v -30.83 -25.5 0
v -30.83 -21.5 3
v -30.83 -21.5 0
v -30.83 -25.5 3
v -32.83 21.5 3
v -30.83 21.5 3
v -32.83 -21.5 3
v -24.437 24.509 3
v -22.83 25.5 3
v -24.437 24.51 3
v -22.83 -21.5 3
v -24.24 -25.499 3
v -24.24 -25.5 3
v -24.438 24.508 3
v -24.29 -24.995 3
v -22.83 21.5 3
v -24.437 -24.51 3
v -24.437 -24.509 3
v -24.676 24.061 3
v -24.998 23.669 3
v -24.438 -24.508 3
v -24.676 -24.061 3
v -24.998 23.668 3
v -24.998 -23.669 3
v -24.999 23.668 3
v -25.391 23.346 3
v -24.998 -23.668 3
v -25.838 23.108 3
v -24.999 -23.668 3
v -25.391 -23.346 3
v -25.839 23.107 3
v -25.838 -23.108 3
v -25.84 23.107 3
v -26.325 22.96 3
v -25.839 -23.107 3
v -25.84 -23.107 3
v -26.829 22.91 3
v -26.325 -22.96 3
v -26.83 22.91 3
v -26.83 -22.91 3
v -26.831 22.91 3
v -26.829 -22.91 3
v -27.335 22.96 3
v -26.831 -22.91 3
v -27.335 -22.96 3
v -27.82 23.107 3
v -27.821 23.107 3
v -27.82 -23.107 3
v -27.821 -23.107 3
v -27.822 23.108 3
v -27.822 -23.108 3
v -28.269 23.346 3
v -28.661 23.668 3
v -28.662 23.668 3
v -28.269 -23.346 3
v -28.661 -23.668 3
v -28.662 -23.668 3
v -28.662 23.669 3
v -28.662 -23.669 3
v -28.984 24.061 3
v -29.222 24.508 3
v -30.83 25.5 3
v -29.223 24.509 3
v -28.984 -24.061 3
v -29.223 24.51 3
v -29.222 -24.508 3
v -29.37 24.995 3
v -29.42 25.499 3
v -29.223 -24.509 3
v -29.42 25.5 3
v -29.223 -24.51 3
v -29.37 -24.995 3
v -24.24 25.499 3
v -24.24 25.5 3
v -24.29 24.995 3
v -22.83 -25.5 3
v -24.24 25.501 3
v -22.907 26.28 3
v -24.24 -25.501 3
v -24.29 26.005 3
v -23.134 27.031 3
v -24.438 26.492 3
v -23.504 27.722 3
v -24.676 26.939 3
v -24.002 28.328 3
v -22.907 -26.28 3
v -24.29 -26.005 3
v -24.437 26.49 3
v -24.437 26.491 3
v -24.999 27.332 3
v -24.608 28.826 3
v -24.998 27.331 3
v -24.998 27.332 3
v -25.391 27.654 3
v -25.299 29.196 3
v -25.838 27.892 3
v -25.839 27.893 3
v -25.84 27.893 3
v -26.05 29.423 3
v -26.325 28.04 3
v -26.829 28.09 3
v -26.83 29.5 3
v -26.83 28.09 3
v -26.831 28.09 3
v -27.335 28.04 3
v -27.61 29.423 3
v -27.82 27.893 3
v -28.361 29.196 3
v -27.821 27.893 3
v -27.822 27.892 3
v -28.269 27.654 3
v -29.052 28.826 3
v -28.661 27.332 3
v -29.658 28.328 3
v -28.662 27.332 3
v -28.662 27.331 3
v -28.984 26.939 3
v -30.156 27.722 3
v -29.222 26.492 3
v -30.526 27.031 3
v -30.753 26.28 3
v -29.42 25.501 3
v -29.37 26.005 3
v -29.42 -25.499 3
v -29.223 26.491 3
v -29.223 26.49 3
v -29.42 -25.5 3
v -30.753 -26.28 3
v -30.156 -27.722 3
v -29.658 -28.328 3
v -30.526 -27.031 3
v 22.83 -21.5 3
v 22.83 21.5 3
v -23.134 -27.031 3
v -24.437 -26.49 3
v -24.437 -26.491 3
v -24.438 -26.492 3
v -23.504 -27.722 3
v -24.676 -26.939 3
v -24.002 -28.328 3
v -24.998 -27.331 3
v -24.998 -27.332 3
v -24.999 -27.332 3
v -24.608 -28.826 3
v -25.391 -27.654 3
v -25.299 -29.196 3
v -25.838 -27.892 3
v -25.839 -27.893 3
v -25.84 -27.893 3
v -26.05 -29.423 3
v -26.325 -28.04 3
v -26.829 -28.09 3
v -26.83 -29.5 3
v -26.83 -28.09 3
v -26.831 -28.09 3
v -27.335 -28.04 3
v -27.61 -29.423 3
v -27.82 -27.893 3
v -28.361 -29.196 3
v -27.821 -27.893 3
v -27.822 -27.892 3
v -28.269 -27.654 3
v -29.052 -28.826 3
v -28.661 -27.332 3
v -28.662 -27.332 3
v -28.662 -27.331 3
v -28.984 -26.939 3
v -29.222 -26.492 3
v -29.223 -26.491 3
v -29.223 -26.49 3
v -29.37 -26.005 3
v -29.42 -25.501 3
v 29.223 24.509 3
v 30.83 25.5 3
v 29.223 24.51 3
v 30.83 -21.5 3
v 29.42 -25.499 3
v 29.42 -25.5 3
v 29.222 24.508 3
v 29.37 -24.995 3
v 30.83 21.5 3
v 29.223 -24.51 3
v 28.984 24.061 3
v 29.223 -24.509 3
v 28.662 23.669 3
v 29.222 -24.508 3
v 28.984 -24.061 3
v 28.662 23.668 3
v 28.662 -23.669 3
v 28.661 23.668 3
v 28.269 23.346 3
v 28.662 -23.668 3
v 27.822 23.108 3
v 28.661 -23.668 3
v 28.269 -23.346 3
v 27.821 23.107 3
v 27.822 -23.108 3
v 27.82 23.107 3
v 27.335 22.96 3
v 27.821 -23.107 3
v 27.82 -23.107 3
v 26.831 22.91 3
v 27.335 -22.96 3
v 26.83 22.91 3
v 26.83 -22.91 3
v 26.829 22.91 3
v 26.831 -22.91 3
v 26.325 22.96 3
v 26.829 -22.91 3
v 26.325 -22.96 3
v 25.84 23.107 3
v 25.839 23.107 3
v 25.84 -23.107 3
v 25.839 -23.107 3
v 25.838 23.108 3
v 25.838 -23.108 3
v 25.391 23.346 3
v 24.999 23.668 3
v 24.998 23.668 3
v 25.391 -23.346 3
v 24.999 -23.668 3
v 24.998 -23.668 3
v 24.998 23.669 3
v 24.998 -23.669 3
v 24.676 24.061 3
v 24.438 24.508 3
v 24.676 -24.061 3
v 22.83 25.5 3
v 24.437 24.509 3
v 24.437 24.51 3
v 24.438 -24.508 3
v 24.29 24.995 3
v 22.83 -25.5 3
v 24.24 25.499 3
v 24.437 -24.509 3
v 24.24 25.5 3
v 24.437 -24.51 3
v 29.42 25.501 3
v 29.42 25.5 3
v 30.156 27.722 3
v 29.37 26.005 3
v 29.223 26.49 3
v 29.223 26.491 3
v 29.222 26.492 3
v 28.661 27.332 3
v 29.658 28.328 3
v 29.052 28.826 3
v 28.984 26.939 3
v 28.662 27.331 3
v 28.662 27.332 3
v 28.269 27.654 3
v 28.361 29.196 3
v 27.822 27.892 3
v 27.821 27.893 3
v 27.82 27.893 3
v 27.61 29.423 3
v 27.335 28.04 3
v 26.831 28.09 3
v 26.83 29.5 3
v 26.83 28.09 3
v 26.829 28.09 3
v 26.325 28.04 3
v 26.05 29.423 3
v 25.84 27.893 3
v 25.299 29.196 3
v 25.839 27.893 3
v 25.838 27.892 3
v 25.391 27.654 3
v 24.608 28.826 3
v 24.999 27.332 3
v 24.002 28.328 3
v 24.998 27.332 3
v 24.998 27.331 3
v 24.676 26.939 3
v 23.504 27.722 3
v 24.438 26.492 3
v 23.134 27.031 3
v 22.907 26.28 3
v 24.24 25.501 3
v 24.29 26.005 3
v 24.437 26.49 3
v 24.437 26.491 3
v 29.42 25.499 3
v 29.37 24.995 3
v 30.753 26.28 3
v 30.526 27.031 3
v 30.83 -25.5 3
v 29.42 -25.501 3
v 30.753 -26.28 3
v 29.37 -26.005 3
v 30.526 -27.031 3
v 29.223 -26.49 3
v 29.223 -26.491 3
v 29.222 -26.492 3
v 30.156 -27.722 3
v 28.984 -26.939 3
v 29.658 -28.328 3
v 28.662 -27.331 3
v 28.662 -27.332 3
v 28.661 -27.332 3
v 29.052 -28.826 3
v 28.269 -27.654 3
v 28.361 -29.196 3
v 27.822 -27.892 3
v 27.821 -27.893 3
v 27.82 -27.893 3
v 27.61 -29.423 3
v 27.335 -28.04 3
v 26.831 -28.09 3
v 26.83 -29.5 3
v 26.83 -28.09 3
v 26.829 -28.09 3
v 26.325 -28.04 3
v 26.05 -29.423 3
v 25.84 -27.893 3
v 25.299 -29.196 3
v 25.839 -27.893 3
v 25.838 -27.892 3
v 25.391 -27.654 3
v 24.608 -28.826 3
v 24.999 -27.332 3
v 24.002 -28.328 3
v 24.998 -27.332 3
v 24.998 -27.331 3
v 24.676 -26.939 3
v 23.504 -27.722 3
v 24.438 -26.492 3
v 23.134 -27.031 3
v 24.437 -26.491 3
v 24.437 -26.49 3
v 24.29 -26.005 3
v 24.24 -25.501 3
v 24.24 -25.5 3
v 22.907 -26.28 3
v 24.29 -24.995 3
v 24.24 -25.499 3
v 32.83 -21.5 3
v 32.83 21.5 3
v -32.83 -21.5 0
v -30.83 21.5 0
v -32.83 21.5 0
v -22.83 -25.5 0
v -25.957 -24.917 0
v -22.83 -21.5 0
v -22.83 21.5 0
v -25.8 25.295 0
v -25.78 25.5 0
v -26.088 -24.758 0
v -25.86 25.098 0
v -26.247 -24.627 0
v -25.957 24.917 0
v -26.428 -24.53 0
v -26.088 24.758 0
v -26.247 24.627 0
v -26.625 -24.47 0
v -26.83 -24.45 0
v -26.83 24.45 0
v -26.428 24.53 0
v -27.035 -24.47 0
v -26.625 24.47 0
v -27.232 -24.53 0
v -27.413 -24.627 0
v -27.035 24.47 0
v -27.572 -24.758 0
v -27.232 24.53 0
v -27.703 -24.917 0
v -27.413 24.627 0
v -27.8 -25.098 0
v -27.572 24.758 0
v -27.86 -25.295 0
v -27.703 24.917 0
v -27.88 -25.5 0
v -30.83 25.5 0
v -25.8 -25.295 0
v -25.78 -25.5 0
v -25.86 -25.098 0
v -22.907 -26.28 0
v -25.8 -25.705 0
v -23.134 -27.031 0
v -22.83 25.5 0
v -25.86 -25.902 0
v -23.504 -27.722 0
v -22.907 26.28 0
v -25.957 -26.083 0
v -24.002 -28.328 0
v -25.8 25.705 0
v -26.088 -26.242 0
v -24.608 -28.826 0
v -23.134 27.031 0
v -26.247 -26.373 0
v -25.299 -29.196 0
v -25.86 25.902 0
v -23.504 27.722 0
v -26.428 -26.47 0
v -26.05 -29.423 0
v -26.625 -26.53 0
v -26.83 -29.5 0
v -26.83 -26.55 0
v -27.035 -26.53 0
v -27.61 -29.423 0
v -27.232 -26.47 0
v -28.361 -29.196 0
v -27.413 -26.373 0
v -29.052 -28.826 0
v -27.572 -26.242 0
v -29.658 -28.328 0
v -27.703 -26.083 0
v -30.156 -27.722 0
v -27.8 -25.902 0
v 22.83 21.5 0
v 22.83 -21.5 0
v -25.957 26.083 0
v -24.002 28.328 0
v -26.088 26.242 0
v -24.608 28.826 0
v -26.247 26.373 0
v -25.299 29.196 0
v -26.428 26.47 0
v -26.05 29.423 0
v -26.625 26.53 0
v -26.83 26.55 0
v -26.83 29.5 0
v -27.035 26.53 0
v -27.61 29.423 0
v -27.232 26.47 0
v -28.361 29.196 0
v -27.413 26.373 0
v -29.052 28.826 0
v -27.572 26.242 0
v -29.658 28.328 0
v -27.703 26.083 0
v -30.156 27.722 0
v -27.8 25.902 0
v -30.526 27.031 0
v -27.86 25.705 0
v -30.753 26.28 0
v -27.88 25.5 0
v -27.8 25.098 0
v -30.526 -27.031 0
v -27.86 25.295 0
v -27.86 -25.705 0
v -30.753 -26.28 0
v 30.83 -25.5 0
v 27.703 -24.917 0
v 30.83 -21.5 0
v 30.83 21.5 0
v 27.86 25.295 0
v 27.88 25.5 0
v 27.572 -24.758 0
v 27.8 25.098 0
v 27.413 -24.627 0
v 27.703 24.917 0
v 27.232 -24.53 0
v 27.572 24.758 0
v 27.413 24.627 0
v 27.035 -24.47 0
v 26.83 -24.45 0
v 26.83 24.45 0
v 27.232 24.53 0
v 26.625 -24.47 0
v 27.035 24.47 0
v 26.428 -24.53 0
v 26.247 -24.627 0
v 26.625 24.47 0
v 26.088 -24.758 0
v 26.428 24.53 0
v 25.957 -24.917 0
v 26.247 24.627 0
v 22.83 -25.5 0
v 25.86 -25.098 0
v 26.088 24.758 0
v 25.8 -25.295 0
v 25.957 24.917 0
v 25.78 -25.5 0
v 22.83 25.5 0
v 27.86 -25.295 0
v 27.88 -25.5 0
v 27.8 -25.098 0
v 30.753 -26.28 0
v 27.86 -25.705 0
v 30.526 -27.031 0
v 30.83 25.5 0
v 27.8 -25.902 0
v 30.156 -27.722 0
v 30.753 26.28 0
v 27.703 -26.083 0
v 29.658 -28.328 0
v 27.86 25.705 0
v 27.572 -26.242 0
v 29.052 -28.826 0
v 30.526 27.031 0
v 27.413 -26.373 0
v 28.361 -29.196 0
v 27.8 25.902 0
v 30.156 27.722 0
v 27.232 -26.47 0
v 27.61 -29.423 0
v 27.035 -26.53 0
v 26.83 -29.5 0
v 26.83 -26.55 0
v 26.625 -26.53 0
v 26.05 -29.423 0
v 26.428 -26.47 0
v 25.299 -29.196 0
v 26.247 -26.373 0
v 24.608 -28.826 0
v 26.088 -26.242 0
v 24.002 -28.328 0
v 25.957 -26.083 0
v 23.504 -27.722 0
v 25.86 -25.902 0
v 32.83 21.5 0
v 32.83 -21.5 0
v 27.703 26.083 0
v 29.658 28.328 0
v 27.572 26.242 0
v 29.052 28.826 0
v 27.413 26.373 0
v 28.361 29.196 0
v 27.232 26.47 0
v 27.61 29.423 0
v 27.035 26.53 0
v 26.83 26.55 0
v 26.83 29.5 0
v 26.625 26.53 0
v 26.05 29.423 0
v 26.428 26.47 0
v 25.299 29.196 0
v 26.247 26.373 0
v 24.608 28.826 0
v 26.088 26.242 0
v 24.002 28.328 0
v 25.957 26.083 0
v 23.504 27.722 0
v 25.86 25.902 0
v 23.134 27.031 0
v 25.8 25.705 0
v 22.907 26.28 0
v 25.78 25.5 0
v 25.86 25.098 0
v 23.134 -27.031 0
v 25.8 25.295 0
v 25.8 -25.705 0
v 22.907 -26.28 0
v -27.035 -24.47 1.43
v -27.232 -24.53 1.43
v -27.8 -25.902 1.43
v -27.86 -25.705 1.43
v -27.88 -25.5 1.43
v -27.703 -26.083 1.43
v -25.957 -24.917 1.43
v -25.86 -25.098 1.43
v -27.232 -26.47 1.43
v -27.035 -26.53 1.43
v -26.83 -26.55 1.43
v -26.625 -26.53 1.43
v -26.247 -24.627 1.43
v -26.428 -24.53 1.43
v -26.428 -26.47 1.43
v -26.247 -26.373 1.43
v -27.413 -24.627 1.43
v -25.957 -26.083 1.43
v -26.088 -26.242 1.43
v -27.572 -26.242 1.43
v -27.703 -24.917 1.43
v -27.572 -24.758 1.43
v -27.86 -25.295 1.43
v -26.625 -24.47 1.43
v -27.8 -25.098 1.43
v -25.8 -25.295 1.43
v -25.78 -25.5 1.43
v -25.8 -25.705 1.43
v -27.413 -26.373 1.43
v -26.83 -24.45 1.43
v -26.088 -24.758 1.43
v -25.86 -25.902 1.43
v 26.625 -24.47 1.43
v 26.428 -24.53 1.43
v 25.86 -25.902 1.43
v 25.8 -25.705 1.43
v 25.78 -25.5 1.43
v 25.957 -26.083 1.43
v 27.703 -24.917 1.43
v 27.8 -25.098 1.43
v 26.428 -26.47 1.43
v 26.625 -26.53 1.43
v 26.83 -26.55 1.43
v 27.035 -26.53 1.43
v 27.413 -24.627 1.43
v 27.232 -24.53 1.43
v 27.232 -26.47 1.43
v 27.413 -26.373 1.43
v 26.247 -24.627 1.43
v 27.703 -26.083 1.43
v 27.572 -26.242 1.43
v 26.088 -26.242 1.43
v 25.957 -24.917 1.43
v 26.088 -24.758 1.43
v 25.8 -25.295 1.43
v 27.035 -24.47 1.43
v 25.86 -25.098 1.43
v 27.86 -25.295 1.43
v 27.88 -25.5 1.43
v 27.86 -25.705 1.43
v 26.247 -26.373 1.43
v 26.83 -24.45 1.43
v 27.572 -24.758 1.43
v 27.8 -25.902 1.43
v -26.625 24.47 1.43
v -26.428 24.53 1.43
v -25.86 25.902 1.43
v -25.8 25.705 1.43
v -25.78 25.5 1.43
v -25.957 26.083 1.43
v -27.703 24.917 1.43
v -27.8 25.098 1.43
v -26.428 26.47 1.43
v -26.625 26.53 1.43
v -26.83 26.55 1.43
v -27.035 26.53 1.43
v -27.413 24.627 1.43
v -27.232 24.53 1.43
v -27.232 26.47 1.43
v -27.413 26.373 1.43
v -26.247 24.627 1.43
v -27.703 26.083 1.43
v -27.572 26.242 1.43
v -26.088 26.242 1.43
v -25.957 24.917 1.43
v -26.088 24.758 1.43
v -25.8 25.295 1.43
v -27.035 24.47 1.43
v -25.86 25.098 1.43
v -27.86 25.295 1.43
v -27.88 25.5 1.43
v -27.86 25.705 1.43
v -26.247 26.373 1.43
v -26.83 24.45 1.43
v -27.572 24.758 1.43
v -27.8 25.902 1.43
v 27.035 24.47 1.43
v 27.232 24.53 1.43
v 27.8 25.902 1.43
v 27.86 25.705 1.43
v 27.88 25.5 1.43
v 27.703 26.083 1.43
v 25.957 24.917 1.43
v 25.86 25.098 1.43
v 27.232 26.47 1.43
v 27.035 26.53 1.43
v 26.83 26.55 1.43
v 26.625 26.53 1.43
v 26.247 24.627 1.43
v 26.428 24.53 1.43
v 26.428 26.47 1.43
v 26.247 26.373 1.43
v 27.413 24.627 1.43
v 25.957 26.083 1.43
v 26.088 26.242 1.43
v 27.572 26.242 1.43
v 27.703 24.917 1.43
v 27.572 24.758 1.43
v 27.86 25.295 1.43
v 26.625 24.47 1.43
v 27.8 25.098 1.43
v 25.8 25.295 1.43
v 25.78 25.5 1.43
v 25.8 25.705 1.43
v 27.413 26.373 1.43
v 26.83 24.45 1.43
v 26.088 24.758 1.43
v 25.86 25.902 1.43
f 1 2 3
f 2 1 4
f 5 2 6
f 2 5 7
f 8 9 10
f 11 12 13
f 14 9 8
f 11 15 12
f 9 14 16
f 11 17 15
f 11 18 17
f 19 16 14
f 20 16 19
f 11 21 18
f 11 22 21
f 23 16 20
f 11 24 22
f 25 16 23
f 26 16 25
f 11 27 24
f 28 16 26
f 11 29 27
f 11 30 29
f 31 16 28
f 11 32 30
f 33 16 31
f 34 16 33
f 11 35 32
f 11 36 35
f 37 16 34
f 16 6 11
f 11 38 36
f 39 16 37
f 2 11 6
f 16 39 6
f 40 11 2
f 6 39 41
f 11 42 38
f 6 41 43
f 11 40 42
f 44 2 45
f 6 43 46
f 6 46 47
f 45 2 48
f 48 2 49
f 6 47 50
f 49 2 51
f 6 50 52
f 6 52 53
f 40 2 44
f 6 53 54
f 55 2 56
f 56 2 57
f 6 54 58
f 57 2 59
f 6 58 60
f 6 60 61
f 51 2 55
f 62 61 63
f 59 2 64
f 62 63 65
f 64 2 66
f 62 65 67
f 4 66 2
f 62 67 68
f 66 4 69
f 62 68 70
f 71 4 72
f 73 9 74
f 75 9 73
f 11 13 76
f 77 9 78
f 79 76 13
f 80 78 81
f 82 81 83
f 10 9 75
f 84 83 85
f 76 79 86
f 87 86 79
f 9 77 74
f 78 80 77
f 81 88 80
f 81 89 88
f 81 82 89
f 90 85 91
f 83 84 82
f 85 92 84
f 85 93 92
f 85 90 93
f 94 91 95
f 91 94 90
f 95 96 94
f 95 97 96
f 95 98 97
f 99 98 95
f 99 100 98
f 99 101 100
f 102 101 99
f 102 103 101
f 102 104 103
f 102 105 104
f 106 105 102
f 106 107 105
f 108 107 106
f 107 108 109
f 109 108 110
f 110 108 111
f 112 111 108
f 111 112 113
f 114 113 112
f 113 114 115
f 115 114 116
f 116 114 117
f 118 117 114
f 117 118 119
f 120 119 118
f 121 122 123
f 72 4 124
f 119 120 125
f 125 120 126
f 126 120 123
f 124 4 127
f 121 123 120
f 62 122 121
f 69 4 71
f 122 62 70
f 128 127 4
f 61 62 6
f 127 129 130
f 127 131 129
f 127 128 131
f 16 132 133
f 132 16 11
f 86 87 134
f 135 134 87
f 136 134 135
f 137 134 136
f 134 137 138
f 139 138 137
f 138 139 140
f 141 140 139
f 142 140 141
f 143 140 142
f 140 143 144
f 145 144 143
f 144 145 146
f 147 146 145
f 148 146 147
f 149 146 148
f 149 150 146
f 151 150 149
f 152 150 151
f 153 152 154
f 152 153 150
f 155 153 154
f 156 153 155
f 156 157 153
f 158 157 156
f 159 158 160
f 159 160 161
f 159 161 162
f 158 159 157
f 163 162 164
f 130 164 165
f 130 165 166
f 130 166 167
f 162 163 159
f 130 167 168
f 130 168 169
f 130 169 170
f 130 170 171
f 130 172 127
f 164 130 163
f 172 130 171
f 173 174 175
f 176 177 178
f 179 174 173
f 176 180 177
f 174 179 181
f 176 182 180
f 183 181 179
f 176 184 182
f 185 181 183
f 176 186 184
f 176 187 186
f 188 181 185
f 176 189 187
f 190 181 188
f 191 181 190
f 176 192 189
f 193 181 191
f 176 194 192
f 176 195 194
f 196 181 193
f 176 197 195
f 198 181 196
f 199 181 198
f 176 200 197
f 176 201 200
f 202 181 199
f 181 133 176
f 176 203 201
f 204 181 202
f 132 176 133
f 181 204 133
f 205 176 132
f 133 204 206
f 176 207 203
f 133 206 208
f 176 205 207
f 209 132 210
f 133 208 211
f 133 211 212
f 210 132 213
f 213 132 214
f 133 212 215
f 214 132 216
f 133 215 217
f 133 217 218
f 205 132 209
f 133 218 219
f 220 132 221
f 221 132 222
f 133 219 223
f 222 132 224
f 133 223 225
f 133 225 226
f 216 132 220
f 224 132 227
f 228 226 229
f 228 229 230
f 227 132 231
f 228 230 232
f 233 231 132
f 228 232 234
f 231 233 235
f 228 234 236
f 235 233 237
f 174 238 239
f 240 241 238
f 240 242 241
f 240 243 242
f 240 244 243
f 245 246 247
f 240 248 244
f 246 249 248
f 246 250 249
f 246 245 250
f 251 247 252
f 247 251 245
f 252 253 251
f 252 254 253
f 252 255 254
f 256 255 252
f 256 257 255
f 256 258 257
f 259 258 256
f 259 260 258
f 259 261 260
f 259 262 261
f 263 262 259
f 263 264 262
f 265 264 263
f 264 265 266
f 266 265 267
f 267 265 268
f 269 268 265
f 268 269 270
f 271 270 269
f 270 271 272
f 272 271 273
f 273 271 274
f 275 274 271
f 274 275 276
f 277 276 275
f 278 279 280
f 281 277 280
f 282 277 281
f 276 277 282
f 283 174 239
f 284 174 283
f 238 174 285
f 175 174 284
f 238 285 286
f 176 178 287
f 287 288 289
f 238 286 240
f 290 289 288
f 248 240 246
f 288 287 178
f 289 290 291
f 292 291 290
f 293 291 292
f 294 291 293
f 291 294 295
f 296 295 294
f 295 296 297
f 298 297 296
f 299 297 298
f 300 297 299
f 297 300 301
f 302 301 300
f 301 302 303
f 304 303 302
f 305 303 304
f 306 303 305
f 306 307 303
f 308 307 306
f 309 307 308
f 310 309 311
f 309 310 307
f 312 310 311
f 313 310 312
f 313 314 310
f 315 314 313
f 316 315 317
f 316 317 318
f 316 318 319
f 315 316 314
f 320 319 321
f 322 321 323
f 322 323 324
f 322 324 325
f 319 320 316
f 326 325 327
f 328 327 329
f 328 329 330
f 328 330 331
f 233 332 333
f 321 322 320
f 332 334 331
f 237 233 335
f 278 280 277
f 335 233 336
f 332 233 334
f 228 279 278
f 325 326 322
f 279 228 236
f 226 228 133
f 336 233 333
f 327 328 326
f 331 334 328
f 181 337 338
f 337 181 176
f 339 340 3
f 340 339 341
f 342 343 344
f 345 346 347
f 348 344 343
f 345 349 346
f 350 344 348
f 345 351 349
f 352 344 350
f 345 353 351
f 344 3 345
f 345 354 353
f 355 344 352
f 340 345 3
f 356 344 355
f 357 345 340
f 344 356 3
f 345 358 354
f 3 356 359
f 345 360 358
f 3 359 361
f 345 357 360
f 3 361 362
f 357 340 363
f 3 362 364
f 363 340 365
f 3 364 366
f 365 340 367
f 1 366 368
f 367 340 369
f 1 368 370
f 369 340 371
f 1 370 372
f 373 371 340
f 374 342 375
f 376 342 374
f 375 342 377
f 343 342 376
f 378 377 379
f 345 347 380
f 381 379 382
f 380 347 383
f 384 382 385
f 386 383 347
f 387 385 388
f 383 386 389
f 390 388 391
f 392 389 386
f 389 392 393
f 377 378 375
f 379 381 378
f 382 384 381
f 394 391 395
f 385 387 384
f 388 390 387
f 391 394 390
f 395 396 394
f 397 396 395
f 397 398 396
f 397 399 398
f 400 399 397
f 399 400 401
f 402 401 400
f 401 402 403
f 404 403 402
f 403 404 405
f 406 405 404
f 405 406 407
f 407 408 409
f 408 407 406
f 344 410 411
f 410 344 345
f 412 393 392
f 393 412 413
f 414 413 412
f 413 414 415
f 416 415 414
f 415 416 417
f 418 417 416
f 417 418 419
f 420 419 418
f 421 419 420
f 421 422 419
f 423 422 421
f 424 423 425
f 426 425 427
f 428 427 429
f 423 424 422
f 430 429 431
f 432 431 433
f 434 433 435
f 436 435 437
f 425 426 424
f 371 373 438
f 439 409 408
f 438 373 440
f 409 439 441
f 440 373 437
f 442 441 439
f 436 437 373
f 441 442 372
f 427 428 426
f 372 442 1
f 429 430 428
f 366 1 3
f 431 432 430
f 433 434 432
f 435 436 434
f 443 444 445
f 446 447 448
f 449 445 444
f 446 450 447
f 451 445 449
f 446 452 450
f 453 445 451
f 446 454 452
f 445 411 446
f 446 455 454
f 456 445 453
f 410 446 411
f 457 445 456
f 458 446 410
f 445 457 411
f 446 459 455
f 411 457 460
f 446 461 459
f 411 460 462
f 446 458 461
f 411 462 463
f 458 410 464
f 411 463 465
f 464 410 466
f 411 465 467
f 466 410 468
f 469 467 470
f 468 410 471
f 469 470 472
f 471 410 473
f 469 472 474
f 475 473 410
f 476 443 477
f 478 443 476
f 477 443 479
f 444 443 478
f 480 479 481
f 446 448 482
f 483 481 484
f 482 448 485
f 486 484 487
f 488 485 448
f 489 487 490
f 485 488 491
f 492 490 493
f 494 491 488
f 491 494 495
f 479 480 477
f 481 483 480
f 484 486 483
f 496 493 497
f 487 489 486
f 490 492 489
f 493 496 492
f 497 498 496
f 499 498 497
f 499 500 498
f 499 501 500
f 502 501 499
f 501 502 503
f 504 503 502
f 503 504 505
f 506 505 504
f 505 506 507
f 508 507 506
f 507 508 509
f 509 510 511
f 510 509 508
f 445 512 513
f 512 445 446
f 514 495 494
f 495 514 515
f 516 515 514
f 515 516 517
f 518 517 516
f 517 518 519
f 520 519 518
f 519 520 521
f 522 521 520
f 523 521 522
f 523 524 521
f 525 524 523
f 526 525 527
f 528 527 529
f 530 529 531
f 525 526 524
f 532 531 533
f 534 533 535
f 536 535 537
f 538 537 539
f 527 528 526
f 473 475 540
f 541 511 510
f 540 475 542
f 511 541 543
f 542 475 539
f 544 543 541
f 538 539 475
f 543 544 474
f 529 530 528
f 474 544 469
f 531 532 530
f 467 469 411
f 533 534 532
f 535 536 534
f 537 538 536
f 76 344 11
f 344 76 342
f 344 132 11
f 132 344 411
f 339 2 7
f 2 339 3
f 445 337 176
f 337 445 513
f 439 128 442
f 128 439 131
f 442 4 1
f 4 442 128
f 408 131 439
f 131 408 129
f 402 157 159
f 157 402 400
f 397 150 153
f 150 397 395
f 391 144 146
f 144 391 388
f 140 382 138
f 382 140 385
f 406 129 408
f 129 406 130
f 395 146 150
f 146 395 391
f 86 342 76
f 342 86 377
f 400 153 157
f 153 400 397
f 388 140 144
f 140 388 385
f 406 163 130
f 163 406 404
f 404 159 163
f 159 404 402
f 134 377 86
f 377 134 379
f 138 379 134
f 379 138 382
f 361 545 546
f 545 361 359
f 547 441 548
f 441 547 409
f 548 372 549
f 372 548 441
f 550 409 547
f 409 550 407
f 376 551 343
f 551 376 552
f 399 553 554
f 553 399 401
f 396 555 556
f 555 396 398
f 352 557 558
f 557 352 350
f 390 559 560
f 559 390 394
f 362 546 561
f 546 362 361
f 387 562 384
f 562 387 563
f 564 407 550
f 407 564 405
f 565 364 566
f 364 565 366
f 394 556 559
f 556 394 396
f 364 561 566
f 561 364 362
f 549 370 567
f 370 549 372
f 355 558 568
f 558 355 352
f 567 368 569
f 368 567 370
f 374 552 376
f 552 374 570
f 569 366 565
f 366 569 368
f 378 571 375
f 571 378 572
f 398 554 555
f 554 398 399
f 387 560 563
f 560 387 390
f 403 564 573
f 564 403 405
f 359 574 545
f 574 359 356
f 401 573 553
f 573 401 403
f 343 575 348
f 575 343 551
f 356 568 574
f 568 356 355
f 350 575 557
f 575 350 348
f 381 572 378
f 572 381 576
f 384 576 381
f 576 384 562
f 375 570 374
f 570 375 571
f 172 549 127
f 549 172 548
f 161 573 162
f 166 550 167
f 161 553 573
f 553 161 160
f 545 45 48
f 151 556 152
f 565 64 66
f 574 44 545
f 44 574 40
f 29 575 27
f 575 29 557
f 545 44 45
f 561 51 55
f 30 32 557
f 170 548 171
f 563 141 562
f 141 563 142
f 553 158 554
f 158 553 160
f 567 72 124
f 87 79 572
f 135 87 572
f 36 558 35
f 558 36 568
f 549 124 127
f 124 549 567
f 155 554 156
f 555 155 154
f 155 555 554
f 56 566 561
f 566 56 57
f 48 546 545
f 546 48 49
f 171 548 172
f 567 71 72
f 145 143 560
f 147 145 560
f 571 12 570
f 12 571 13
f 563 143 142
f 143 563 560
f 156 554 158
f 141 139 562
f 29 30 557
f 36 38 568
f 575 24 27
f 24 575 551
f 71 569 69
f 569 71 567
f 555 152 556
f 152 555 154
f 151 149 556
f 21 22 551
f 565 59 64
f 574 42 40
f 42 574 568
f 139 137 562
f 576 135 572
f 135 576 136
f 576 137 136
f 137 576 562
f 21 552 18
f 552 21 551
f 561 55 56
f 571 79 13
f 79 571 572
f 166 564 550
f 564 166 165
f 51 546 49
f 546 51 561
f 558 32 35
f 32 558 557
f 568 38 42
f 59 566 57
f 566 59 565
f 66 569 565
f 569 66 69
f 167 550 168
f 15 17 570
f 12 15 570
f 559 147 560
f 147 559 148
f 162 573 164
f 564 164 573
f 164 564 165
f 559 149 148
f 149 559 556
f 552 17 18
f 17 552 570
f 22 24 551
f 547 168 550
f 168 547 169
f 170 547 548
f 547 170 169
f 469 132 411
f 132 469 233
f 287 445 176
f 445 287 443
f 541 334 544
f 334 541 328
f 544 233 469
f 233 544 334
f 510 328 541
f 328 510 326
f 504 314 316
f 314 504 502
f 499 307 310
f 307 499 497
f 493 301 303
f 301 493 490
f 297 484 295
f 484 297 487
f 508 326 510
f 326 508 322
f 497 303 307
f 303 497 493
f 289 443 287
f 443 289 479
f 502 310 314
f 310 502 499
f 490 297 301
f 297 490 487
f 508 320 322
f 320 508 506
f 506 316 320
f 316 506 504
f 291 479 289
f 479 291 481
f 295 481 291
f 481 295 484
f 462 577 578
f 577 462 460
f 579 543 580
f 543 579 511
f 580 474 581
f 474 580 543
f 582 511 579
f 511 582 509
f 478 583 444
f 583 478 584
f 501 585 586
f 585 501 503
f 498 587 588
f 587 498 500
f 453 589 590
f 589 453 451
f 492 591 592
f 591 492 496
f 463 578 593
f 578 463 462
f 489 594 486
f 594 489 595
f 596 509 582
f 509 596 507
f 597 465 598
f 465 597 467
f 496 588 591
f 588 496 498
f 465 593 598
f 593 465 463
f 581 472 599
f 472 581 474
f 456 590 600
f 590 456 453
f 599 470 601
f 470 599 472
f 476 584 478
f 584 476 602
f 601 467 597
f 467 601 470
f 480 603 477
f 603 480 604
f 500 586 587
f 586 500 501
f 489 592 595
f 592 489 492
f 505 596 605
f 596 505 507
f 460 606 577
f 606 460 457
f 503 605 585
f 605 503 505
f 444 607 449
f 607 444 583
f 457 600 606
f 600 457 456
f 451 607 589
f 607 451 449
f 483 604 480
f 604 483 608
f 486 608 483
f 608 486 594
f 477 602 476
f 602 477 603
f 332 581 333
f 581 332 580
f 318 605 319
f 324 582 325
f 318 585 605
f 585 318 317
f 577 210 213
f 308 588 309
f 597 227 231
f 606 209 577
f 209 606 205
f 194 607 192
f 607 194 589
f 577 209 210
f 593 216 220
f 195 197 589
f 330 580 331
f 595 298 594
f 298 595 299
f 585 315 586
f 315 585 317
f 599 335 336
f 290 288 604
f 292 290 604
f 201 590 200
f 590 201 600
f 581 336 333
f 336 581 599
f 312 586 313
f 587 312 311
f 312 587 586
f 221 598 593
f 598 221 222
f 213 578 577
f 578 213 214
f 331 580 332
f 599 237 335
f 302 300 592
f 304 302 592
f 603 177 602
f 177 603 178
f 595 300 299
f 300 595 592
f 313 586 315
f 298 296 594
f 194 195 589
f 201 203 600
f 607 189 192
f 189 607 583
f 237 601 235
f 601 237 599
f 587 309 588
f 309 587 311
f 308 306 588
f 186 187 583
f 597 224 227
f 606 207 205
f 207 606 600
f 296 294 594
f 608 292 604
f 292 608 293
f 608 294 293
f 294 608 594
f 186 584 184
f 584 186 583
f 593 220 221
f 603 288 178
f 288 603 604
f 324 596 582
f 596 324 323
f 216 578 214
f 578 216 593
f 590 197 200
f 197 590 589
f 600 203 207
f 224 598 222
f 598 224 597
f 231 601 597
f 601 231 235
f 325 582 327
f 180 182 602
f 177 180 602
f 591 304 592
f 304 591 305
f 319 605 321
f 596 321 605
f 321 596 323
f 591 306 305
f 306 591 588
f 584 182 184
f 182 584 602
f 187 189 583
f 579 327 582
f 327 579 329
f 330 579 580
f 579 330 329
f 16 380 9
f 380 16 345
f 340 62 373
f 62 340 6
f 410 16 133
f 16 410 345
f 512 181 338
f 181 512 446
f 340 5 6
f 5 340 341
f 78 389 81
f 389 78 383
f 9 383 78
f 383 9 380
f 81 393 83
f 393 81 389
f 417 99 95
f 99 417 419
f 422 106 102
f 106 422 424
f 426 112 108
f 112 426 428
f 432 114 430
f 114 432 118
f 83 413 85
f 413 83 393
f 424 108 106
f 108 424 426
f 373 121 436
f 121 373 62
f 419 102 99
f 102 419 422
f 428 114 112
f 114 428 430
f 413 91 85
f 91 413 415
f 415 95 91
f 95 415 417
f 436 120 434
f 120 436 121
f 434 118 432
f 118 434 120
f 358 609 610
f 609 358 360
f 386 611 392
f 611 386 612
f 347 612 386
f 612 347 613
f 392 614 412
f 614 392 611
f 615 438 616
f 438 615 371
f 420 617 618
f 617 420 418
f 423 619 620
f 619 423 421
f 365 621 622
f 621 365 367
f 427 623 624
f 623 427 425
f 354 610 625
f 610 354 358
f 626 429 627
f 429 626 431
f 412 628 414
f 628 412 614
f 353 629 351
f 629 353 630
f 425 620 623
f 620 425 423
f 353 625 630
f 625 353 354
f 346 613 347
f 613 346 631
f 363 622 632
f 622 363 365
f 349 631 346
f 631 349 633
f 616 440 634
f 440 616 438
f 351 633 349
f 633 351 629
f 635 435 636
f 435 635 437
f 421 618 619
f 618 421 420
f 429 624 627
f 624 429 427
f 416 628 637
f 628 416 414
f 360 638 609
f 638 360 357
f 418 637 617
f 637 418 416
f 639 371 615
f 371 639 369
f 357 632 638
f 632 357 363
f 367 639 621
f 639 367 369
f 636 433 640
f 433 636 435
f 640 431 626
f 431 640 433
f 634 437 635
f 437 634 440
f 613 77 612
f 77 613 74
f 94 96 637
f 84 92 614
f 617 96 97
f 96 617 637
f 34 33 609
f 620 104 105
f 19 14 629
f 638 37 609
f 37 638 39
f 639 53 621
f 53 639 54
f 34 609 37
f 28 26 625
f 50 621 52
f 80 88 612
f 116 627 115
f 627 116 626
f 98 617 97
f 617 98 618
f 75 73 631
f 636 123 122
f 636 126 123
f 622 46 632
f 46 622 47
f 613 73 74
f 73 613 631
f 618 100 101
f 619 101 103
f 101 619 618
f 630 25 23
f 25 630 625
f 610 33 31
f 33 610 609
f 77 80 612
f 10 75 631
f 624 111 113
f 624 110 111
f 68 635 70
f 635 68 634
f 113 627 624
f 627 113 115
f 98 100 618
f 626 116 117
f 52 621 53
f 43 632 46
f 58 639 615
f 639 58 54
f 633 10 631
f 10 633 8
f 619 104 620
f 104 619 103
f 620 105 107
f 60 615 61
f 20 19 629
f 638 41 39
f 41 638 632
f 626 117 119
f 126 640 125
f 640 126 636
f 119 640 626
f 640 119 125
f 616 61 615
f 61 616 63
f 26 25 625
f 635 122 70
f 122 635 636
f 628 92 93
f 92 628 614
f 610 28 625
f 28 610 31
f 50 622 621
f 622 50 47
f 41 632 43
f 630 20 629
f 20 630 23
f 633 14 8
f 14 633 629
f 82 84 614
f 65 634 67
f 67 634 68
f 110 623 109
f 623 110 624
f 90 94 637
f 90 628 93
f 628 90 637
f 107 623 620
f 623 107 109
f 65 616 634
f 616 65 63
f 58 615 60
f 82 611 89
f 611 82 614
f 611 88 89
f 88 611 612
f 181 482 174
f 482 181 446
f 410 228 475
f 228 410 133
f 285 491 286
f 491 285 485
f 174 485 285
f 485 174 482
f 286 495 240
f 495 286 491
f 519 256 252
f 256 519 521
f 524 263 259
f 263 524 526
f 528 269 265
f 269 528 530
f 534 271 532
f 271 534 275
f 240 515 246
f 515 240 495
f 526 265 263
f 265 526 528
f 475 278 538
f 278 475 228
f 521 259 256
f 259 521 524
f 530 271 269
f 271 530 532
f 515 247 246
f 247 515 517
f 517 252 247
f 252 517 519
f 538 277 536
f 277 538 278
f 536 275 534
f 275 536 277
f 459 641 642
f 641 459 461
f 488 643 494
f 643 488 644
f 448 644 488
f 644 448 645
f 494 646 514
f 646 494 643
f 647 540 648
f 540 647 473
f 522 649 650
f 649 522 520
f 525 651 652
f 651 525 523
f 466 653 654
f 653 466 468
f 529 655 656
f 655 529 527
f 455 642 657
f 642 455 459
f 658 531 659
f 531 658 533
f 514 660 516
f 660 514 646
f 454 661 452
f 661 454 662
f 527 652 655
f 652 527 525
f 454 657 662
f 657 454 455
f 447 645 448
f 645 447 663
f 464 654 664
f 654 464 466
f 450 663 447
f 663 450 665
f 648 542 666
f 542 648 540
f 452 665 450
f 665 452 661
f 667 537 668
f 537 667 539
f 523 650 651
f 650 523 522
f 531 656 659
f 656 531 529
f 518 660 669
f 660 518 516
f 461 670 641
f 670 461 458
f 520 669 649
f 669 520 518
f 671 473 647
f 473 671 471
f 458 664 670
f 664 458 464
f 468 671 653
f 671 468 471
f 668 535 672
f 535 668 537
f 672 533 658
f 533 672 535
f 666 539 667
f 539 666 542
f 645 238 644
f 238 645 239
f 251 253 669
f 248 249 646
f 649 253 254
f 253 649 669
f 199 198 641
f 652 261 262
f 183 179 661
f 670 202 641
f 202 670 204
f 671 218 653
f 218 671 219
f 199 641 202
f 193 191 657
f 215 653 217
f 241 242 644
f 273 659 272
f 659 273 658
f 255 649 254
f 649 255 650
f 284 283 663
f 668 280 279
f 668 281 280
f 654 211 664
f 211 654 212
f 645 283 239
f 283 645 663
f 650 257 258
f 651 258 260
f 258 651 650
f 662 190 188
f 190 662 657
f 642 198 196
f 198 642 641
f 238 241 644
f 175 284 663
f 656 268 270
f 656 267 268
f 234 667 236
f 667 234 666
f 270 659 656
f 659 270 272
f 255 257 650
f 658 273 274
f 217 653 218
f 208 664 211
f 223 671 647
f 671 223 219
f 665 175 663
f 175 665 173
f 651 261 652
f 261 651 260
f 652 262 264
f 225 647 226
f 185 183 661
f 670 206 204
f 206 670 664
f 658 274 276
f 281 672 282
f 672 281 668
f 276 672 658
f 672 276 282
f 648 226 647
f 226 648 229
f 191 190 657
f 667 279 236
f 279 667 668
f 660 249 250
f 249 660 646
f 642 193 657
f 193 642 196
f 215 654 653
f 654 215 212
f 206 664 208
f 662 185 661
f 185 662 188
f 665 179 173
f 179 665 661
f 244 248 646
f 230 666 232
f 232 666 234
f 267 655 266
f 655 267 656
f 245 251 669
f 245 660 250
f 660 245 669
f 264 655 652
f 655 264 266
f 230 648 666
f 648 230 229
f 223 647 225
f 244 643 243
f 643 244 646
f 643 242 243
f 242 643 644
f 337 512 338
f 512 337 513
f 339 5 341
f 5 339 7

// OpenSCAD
// file: battery_dims.scad
// battery and charging module dimensions
bat_height = 4.76;
bat_width = 34.44;
bat_length = 60.66;
bat_width_wires = 38; // width of the battery with some clearance for the wires on the side

chg_height_bat = 6.84;
chg_height_usb = 4.57;
chg_height_board = 1.22;
chg_width = 25;
chg_length = 21.04;

chg_hole_offset = 2.5;
chg_hole_diameter = 2.2;

usb_opening_length = 12;

// Wiring hole (matching pico sensor for alignment)
bat_wiring_hole_width = 10;
bat_wiring_hole_length = 10;
bat_wiring_clearance_from_battery = 2;
bat_h_wiring_hole_height = 5;

// Battery default args
bat_def_wall_thickness = 2;
bat_def_clearance = 0.5;
bat_def_base_thickness = 2;

// boop
boop = 0.01;

// Function to get enclosure dimensions
function battery_enclosure_dims(
    wall_thickness = bat_def_wall_thickness,
    base_thickness = bat_def_base_thickness,
    clearance = bat_def_clearance
) = [
    bat_length + (2*clearance) + (2*wall_thickness),
    bat_width_wires + (2*clearance) + (2*wall_thickness),
    base_thickness + bat_height + chg_height_bat + 2
];

function get_battery_z(base_thickness = bat_def_base_thickness) = 
    base_thickness + chg_height_bat + 1;

function get_inner_width(clearance = bat_def_clearance) = 
    bat_width_wires + (2*clearance);

function get_wiring_hole_depth(base_thickness = bat_def_base_thickness) = 
    get_battery_z(base_thickness) - bat_wiring_clearance_from_battery;
// file: support.scad
// Module for mounting post with optional support
module mounting_post_assembly(height, diameter, with_support = true, support_height = 0.5) {
  // Main post
  cylinder(h = height, d = diameter, $fn = 32);
  
  // Optional support base
  if (with_support) {
    translate([0, 0, -support_height])
      cylinder(h = support_height, d1 = diameter + 2, d2 = diameter, $fn = 32);
  }
}

// Module for a post with a riser base
module post_with_riser(post_height, post_diameter, riser_height, riser_diameter = 4) {
  // Riser
  cylinder(h = riser_height, d = riser_diameter, $fn = 32);
  
  // Post on top of riser
  translate([0, 0, riser_height - 0.5]) {
    mounting_post_assembly(post_height, post_diameter, true, 0.5);
  }
}

module post_socket(height, post_diameter, thickness = 1, clearance = 0.4) {
  difference() {
    cylinder(h = height, d = post_diameter + thickness, $fn = 32);
    translate([0, 0, -0.01])
    cylinder(h = height, d = post_diameter + clearance, $fn = 32);
  }
}

// Module for corner risers
module corner_riser(width, height) {
  cube([width, width, height]);
}

module screw_insert_tab(insert_diameter, tab_width, tab_height) {
  translate([-(tab_width/2), -(tab_width/2), 0])
  difference() {
    union() {
      cube([tab_width, tab_width/2, tab_height]);

      translate([tab_width/2, tab_width/2, 0])
        cylinder(h = tab_height, d = tab_width, $fn = 32);
    }

    translate([tab_width/2, tab_width/2, -0.01])
      cylinder(h = tab_height + 0.02, d = insert_diameter, $fn = 32);
  }
}

module screw_tab(tab_width, 
  tab_height, 
  screw_diameter, 
  screw_head_height, 
  screw_head_width) {

  translate([-(tab_width/2), -(tab_width/2), 0])
  difference() {
    union() {
      cube([tab_width, tab_width/2, tab_height]);

      translate([tab_width/2, tab_width/2, 0])
        cylinder(h = tab_height, d = tab_width, $fn = 32);
    }

    translate([tab_width/2, 
      tab_width/2, 
      -0.01])
      cylinder(h = tab_height + 0.02, 
        d = screw_diameter, 
        $fn = 32);
    
    translate([tab_width/2, 
      tab_width/2, 
      tab_height - screw_head_height])
      cylinder(h = screw_head_height + 0.01,
        d1 = screw_diameter,
        d2 = screw_head_width,
        $fn = 32);
        
  }
}

screw_insert_tab(4.5, 8, 5);
// main file
// The cover panel for battery_enclosure

use <support.scad>
include <battery_dims.scad>

lid_thickness = 3;

module battery_lid(
  wall_thickness = bat_def_wall_thickness,
  clearance = bat_def_clearance,
  base_thickness = bat_def_base_thickness,

  screw_tab_width = 8,
  screw_tab_height = 3,
  screw_tab_edge_offset = 2,

  // screw specs
  screw_threading_diameter = 2.1,
  screw_head_width = 5.2,
  screw_head_height = 1.57
) {

  enc_dims = battery_enclosure_dims(wall_thickness, base_thickness, clearance);
  enclosure_length = enc_dims[0];
  enclosure_width = enc_dims[1];
  enclosure_height = enc_dims[2];

  translate([-enclosure_length/2, -enclosure_width/2, 0])
  union() {
    cube([enclosure_length, enclosure_width, lid_thickness]);

    // corner screw tabs positioned around outside edges
    rotate(180)
    translate([-screw_tab_width/2 - screw_tab_edge_offset, 
    screw_tab_width/2, 
    0])
    screw_tab(screw_tab_width, screw_tab_height, screw_threading_diameter, screw_head_height, screw_head_width);
    
    rotate(180)
    translate([screw_tab_width/2 - enclosure_length + screw_tab_edge_offset, 
    screw_tab_width/2, 
    0])
    screw_tab(screw_tab_width, screw_tab_height, screw_threading_diameter, screw_head_height, screw_head_width);
    
    translate([screw_tab_width/2 + screw_tab_edge_offset, 
    screw_tab_width/2 + enclosure_width, 
    0])
    screw_tab(screw_tab_width, screw_tab_height, screw_threading_diameter, screw_head_height, screw_head_width);
    
    translate([-screw_tab_width/2 + enclosure_length - screw_tab_edge_offset, 
    screw_tab_width/2 + enclosure_width, 
    0])
    screw_tab(screw_tab_width, screw_tab_height, screw_threading_diameter, screw_head_height, screw_head_width);
  }
}

// example
battery_lid();
